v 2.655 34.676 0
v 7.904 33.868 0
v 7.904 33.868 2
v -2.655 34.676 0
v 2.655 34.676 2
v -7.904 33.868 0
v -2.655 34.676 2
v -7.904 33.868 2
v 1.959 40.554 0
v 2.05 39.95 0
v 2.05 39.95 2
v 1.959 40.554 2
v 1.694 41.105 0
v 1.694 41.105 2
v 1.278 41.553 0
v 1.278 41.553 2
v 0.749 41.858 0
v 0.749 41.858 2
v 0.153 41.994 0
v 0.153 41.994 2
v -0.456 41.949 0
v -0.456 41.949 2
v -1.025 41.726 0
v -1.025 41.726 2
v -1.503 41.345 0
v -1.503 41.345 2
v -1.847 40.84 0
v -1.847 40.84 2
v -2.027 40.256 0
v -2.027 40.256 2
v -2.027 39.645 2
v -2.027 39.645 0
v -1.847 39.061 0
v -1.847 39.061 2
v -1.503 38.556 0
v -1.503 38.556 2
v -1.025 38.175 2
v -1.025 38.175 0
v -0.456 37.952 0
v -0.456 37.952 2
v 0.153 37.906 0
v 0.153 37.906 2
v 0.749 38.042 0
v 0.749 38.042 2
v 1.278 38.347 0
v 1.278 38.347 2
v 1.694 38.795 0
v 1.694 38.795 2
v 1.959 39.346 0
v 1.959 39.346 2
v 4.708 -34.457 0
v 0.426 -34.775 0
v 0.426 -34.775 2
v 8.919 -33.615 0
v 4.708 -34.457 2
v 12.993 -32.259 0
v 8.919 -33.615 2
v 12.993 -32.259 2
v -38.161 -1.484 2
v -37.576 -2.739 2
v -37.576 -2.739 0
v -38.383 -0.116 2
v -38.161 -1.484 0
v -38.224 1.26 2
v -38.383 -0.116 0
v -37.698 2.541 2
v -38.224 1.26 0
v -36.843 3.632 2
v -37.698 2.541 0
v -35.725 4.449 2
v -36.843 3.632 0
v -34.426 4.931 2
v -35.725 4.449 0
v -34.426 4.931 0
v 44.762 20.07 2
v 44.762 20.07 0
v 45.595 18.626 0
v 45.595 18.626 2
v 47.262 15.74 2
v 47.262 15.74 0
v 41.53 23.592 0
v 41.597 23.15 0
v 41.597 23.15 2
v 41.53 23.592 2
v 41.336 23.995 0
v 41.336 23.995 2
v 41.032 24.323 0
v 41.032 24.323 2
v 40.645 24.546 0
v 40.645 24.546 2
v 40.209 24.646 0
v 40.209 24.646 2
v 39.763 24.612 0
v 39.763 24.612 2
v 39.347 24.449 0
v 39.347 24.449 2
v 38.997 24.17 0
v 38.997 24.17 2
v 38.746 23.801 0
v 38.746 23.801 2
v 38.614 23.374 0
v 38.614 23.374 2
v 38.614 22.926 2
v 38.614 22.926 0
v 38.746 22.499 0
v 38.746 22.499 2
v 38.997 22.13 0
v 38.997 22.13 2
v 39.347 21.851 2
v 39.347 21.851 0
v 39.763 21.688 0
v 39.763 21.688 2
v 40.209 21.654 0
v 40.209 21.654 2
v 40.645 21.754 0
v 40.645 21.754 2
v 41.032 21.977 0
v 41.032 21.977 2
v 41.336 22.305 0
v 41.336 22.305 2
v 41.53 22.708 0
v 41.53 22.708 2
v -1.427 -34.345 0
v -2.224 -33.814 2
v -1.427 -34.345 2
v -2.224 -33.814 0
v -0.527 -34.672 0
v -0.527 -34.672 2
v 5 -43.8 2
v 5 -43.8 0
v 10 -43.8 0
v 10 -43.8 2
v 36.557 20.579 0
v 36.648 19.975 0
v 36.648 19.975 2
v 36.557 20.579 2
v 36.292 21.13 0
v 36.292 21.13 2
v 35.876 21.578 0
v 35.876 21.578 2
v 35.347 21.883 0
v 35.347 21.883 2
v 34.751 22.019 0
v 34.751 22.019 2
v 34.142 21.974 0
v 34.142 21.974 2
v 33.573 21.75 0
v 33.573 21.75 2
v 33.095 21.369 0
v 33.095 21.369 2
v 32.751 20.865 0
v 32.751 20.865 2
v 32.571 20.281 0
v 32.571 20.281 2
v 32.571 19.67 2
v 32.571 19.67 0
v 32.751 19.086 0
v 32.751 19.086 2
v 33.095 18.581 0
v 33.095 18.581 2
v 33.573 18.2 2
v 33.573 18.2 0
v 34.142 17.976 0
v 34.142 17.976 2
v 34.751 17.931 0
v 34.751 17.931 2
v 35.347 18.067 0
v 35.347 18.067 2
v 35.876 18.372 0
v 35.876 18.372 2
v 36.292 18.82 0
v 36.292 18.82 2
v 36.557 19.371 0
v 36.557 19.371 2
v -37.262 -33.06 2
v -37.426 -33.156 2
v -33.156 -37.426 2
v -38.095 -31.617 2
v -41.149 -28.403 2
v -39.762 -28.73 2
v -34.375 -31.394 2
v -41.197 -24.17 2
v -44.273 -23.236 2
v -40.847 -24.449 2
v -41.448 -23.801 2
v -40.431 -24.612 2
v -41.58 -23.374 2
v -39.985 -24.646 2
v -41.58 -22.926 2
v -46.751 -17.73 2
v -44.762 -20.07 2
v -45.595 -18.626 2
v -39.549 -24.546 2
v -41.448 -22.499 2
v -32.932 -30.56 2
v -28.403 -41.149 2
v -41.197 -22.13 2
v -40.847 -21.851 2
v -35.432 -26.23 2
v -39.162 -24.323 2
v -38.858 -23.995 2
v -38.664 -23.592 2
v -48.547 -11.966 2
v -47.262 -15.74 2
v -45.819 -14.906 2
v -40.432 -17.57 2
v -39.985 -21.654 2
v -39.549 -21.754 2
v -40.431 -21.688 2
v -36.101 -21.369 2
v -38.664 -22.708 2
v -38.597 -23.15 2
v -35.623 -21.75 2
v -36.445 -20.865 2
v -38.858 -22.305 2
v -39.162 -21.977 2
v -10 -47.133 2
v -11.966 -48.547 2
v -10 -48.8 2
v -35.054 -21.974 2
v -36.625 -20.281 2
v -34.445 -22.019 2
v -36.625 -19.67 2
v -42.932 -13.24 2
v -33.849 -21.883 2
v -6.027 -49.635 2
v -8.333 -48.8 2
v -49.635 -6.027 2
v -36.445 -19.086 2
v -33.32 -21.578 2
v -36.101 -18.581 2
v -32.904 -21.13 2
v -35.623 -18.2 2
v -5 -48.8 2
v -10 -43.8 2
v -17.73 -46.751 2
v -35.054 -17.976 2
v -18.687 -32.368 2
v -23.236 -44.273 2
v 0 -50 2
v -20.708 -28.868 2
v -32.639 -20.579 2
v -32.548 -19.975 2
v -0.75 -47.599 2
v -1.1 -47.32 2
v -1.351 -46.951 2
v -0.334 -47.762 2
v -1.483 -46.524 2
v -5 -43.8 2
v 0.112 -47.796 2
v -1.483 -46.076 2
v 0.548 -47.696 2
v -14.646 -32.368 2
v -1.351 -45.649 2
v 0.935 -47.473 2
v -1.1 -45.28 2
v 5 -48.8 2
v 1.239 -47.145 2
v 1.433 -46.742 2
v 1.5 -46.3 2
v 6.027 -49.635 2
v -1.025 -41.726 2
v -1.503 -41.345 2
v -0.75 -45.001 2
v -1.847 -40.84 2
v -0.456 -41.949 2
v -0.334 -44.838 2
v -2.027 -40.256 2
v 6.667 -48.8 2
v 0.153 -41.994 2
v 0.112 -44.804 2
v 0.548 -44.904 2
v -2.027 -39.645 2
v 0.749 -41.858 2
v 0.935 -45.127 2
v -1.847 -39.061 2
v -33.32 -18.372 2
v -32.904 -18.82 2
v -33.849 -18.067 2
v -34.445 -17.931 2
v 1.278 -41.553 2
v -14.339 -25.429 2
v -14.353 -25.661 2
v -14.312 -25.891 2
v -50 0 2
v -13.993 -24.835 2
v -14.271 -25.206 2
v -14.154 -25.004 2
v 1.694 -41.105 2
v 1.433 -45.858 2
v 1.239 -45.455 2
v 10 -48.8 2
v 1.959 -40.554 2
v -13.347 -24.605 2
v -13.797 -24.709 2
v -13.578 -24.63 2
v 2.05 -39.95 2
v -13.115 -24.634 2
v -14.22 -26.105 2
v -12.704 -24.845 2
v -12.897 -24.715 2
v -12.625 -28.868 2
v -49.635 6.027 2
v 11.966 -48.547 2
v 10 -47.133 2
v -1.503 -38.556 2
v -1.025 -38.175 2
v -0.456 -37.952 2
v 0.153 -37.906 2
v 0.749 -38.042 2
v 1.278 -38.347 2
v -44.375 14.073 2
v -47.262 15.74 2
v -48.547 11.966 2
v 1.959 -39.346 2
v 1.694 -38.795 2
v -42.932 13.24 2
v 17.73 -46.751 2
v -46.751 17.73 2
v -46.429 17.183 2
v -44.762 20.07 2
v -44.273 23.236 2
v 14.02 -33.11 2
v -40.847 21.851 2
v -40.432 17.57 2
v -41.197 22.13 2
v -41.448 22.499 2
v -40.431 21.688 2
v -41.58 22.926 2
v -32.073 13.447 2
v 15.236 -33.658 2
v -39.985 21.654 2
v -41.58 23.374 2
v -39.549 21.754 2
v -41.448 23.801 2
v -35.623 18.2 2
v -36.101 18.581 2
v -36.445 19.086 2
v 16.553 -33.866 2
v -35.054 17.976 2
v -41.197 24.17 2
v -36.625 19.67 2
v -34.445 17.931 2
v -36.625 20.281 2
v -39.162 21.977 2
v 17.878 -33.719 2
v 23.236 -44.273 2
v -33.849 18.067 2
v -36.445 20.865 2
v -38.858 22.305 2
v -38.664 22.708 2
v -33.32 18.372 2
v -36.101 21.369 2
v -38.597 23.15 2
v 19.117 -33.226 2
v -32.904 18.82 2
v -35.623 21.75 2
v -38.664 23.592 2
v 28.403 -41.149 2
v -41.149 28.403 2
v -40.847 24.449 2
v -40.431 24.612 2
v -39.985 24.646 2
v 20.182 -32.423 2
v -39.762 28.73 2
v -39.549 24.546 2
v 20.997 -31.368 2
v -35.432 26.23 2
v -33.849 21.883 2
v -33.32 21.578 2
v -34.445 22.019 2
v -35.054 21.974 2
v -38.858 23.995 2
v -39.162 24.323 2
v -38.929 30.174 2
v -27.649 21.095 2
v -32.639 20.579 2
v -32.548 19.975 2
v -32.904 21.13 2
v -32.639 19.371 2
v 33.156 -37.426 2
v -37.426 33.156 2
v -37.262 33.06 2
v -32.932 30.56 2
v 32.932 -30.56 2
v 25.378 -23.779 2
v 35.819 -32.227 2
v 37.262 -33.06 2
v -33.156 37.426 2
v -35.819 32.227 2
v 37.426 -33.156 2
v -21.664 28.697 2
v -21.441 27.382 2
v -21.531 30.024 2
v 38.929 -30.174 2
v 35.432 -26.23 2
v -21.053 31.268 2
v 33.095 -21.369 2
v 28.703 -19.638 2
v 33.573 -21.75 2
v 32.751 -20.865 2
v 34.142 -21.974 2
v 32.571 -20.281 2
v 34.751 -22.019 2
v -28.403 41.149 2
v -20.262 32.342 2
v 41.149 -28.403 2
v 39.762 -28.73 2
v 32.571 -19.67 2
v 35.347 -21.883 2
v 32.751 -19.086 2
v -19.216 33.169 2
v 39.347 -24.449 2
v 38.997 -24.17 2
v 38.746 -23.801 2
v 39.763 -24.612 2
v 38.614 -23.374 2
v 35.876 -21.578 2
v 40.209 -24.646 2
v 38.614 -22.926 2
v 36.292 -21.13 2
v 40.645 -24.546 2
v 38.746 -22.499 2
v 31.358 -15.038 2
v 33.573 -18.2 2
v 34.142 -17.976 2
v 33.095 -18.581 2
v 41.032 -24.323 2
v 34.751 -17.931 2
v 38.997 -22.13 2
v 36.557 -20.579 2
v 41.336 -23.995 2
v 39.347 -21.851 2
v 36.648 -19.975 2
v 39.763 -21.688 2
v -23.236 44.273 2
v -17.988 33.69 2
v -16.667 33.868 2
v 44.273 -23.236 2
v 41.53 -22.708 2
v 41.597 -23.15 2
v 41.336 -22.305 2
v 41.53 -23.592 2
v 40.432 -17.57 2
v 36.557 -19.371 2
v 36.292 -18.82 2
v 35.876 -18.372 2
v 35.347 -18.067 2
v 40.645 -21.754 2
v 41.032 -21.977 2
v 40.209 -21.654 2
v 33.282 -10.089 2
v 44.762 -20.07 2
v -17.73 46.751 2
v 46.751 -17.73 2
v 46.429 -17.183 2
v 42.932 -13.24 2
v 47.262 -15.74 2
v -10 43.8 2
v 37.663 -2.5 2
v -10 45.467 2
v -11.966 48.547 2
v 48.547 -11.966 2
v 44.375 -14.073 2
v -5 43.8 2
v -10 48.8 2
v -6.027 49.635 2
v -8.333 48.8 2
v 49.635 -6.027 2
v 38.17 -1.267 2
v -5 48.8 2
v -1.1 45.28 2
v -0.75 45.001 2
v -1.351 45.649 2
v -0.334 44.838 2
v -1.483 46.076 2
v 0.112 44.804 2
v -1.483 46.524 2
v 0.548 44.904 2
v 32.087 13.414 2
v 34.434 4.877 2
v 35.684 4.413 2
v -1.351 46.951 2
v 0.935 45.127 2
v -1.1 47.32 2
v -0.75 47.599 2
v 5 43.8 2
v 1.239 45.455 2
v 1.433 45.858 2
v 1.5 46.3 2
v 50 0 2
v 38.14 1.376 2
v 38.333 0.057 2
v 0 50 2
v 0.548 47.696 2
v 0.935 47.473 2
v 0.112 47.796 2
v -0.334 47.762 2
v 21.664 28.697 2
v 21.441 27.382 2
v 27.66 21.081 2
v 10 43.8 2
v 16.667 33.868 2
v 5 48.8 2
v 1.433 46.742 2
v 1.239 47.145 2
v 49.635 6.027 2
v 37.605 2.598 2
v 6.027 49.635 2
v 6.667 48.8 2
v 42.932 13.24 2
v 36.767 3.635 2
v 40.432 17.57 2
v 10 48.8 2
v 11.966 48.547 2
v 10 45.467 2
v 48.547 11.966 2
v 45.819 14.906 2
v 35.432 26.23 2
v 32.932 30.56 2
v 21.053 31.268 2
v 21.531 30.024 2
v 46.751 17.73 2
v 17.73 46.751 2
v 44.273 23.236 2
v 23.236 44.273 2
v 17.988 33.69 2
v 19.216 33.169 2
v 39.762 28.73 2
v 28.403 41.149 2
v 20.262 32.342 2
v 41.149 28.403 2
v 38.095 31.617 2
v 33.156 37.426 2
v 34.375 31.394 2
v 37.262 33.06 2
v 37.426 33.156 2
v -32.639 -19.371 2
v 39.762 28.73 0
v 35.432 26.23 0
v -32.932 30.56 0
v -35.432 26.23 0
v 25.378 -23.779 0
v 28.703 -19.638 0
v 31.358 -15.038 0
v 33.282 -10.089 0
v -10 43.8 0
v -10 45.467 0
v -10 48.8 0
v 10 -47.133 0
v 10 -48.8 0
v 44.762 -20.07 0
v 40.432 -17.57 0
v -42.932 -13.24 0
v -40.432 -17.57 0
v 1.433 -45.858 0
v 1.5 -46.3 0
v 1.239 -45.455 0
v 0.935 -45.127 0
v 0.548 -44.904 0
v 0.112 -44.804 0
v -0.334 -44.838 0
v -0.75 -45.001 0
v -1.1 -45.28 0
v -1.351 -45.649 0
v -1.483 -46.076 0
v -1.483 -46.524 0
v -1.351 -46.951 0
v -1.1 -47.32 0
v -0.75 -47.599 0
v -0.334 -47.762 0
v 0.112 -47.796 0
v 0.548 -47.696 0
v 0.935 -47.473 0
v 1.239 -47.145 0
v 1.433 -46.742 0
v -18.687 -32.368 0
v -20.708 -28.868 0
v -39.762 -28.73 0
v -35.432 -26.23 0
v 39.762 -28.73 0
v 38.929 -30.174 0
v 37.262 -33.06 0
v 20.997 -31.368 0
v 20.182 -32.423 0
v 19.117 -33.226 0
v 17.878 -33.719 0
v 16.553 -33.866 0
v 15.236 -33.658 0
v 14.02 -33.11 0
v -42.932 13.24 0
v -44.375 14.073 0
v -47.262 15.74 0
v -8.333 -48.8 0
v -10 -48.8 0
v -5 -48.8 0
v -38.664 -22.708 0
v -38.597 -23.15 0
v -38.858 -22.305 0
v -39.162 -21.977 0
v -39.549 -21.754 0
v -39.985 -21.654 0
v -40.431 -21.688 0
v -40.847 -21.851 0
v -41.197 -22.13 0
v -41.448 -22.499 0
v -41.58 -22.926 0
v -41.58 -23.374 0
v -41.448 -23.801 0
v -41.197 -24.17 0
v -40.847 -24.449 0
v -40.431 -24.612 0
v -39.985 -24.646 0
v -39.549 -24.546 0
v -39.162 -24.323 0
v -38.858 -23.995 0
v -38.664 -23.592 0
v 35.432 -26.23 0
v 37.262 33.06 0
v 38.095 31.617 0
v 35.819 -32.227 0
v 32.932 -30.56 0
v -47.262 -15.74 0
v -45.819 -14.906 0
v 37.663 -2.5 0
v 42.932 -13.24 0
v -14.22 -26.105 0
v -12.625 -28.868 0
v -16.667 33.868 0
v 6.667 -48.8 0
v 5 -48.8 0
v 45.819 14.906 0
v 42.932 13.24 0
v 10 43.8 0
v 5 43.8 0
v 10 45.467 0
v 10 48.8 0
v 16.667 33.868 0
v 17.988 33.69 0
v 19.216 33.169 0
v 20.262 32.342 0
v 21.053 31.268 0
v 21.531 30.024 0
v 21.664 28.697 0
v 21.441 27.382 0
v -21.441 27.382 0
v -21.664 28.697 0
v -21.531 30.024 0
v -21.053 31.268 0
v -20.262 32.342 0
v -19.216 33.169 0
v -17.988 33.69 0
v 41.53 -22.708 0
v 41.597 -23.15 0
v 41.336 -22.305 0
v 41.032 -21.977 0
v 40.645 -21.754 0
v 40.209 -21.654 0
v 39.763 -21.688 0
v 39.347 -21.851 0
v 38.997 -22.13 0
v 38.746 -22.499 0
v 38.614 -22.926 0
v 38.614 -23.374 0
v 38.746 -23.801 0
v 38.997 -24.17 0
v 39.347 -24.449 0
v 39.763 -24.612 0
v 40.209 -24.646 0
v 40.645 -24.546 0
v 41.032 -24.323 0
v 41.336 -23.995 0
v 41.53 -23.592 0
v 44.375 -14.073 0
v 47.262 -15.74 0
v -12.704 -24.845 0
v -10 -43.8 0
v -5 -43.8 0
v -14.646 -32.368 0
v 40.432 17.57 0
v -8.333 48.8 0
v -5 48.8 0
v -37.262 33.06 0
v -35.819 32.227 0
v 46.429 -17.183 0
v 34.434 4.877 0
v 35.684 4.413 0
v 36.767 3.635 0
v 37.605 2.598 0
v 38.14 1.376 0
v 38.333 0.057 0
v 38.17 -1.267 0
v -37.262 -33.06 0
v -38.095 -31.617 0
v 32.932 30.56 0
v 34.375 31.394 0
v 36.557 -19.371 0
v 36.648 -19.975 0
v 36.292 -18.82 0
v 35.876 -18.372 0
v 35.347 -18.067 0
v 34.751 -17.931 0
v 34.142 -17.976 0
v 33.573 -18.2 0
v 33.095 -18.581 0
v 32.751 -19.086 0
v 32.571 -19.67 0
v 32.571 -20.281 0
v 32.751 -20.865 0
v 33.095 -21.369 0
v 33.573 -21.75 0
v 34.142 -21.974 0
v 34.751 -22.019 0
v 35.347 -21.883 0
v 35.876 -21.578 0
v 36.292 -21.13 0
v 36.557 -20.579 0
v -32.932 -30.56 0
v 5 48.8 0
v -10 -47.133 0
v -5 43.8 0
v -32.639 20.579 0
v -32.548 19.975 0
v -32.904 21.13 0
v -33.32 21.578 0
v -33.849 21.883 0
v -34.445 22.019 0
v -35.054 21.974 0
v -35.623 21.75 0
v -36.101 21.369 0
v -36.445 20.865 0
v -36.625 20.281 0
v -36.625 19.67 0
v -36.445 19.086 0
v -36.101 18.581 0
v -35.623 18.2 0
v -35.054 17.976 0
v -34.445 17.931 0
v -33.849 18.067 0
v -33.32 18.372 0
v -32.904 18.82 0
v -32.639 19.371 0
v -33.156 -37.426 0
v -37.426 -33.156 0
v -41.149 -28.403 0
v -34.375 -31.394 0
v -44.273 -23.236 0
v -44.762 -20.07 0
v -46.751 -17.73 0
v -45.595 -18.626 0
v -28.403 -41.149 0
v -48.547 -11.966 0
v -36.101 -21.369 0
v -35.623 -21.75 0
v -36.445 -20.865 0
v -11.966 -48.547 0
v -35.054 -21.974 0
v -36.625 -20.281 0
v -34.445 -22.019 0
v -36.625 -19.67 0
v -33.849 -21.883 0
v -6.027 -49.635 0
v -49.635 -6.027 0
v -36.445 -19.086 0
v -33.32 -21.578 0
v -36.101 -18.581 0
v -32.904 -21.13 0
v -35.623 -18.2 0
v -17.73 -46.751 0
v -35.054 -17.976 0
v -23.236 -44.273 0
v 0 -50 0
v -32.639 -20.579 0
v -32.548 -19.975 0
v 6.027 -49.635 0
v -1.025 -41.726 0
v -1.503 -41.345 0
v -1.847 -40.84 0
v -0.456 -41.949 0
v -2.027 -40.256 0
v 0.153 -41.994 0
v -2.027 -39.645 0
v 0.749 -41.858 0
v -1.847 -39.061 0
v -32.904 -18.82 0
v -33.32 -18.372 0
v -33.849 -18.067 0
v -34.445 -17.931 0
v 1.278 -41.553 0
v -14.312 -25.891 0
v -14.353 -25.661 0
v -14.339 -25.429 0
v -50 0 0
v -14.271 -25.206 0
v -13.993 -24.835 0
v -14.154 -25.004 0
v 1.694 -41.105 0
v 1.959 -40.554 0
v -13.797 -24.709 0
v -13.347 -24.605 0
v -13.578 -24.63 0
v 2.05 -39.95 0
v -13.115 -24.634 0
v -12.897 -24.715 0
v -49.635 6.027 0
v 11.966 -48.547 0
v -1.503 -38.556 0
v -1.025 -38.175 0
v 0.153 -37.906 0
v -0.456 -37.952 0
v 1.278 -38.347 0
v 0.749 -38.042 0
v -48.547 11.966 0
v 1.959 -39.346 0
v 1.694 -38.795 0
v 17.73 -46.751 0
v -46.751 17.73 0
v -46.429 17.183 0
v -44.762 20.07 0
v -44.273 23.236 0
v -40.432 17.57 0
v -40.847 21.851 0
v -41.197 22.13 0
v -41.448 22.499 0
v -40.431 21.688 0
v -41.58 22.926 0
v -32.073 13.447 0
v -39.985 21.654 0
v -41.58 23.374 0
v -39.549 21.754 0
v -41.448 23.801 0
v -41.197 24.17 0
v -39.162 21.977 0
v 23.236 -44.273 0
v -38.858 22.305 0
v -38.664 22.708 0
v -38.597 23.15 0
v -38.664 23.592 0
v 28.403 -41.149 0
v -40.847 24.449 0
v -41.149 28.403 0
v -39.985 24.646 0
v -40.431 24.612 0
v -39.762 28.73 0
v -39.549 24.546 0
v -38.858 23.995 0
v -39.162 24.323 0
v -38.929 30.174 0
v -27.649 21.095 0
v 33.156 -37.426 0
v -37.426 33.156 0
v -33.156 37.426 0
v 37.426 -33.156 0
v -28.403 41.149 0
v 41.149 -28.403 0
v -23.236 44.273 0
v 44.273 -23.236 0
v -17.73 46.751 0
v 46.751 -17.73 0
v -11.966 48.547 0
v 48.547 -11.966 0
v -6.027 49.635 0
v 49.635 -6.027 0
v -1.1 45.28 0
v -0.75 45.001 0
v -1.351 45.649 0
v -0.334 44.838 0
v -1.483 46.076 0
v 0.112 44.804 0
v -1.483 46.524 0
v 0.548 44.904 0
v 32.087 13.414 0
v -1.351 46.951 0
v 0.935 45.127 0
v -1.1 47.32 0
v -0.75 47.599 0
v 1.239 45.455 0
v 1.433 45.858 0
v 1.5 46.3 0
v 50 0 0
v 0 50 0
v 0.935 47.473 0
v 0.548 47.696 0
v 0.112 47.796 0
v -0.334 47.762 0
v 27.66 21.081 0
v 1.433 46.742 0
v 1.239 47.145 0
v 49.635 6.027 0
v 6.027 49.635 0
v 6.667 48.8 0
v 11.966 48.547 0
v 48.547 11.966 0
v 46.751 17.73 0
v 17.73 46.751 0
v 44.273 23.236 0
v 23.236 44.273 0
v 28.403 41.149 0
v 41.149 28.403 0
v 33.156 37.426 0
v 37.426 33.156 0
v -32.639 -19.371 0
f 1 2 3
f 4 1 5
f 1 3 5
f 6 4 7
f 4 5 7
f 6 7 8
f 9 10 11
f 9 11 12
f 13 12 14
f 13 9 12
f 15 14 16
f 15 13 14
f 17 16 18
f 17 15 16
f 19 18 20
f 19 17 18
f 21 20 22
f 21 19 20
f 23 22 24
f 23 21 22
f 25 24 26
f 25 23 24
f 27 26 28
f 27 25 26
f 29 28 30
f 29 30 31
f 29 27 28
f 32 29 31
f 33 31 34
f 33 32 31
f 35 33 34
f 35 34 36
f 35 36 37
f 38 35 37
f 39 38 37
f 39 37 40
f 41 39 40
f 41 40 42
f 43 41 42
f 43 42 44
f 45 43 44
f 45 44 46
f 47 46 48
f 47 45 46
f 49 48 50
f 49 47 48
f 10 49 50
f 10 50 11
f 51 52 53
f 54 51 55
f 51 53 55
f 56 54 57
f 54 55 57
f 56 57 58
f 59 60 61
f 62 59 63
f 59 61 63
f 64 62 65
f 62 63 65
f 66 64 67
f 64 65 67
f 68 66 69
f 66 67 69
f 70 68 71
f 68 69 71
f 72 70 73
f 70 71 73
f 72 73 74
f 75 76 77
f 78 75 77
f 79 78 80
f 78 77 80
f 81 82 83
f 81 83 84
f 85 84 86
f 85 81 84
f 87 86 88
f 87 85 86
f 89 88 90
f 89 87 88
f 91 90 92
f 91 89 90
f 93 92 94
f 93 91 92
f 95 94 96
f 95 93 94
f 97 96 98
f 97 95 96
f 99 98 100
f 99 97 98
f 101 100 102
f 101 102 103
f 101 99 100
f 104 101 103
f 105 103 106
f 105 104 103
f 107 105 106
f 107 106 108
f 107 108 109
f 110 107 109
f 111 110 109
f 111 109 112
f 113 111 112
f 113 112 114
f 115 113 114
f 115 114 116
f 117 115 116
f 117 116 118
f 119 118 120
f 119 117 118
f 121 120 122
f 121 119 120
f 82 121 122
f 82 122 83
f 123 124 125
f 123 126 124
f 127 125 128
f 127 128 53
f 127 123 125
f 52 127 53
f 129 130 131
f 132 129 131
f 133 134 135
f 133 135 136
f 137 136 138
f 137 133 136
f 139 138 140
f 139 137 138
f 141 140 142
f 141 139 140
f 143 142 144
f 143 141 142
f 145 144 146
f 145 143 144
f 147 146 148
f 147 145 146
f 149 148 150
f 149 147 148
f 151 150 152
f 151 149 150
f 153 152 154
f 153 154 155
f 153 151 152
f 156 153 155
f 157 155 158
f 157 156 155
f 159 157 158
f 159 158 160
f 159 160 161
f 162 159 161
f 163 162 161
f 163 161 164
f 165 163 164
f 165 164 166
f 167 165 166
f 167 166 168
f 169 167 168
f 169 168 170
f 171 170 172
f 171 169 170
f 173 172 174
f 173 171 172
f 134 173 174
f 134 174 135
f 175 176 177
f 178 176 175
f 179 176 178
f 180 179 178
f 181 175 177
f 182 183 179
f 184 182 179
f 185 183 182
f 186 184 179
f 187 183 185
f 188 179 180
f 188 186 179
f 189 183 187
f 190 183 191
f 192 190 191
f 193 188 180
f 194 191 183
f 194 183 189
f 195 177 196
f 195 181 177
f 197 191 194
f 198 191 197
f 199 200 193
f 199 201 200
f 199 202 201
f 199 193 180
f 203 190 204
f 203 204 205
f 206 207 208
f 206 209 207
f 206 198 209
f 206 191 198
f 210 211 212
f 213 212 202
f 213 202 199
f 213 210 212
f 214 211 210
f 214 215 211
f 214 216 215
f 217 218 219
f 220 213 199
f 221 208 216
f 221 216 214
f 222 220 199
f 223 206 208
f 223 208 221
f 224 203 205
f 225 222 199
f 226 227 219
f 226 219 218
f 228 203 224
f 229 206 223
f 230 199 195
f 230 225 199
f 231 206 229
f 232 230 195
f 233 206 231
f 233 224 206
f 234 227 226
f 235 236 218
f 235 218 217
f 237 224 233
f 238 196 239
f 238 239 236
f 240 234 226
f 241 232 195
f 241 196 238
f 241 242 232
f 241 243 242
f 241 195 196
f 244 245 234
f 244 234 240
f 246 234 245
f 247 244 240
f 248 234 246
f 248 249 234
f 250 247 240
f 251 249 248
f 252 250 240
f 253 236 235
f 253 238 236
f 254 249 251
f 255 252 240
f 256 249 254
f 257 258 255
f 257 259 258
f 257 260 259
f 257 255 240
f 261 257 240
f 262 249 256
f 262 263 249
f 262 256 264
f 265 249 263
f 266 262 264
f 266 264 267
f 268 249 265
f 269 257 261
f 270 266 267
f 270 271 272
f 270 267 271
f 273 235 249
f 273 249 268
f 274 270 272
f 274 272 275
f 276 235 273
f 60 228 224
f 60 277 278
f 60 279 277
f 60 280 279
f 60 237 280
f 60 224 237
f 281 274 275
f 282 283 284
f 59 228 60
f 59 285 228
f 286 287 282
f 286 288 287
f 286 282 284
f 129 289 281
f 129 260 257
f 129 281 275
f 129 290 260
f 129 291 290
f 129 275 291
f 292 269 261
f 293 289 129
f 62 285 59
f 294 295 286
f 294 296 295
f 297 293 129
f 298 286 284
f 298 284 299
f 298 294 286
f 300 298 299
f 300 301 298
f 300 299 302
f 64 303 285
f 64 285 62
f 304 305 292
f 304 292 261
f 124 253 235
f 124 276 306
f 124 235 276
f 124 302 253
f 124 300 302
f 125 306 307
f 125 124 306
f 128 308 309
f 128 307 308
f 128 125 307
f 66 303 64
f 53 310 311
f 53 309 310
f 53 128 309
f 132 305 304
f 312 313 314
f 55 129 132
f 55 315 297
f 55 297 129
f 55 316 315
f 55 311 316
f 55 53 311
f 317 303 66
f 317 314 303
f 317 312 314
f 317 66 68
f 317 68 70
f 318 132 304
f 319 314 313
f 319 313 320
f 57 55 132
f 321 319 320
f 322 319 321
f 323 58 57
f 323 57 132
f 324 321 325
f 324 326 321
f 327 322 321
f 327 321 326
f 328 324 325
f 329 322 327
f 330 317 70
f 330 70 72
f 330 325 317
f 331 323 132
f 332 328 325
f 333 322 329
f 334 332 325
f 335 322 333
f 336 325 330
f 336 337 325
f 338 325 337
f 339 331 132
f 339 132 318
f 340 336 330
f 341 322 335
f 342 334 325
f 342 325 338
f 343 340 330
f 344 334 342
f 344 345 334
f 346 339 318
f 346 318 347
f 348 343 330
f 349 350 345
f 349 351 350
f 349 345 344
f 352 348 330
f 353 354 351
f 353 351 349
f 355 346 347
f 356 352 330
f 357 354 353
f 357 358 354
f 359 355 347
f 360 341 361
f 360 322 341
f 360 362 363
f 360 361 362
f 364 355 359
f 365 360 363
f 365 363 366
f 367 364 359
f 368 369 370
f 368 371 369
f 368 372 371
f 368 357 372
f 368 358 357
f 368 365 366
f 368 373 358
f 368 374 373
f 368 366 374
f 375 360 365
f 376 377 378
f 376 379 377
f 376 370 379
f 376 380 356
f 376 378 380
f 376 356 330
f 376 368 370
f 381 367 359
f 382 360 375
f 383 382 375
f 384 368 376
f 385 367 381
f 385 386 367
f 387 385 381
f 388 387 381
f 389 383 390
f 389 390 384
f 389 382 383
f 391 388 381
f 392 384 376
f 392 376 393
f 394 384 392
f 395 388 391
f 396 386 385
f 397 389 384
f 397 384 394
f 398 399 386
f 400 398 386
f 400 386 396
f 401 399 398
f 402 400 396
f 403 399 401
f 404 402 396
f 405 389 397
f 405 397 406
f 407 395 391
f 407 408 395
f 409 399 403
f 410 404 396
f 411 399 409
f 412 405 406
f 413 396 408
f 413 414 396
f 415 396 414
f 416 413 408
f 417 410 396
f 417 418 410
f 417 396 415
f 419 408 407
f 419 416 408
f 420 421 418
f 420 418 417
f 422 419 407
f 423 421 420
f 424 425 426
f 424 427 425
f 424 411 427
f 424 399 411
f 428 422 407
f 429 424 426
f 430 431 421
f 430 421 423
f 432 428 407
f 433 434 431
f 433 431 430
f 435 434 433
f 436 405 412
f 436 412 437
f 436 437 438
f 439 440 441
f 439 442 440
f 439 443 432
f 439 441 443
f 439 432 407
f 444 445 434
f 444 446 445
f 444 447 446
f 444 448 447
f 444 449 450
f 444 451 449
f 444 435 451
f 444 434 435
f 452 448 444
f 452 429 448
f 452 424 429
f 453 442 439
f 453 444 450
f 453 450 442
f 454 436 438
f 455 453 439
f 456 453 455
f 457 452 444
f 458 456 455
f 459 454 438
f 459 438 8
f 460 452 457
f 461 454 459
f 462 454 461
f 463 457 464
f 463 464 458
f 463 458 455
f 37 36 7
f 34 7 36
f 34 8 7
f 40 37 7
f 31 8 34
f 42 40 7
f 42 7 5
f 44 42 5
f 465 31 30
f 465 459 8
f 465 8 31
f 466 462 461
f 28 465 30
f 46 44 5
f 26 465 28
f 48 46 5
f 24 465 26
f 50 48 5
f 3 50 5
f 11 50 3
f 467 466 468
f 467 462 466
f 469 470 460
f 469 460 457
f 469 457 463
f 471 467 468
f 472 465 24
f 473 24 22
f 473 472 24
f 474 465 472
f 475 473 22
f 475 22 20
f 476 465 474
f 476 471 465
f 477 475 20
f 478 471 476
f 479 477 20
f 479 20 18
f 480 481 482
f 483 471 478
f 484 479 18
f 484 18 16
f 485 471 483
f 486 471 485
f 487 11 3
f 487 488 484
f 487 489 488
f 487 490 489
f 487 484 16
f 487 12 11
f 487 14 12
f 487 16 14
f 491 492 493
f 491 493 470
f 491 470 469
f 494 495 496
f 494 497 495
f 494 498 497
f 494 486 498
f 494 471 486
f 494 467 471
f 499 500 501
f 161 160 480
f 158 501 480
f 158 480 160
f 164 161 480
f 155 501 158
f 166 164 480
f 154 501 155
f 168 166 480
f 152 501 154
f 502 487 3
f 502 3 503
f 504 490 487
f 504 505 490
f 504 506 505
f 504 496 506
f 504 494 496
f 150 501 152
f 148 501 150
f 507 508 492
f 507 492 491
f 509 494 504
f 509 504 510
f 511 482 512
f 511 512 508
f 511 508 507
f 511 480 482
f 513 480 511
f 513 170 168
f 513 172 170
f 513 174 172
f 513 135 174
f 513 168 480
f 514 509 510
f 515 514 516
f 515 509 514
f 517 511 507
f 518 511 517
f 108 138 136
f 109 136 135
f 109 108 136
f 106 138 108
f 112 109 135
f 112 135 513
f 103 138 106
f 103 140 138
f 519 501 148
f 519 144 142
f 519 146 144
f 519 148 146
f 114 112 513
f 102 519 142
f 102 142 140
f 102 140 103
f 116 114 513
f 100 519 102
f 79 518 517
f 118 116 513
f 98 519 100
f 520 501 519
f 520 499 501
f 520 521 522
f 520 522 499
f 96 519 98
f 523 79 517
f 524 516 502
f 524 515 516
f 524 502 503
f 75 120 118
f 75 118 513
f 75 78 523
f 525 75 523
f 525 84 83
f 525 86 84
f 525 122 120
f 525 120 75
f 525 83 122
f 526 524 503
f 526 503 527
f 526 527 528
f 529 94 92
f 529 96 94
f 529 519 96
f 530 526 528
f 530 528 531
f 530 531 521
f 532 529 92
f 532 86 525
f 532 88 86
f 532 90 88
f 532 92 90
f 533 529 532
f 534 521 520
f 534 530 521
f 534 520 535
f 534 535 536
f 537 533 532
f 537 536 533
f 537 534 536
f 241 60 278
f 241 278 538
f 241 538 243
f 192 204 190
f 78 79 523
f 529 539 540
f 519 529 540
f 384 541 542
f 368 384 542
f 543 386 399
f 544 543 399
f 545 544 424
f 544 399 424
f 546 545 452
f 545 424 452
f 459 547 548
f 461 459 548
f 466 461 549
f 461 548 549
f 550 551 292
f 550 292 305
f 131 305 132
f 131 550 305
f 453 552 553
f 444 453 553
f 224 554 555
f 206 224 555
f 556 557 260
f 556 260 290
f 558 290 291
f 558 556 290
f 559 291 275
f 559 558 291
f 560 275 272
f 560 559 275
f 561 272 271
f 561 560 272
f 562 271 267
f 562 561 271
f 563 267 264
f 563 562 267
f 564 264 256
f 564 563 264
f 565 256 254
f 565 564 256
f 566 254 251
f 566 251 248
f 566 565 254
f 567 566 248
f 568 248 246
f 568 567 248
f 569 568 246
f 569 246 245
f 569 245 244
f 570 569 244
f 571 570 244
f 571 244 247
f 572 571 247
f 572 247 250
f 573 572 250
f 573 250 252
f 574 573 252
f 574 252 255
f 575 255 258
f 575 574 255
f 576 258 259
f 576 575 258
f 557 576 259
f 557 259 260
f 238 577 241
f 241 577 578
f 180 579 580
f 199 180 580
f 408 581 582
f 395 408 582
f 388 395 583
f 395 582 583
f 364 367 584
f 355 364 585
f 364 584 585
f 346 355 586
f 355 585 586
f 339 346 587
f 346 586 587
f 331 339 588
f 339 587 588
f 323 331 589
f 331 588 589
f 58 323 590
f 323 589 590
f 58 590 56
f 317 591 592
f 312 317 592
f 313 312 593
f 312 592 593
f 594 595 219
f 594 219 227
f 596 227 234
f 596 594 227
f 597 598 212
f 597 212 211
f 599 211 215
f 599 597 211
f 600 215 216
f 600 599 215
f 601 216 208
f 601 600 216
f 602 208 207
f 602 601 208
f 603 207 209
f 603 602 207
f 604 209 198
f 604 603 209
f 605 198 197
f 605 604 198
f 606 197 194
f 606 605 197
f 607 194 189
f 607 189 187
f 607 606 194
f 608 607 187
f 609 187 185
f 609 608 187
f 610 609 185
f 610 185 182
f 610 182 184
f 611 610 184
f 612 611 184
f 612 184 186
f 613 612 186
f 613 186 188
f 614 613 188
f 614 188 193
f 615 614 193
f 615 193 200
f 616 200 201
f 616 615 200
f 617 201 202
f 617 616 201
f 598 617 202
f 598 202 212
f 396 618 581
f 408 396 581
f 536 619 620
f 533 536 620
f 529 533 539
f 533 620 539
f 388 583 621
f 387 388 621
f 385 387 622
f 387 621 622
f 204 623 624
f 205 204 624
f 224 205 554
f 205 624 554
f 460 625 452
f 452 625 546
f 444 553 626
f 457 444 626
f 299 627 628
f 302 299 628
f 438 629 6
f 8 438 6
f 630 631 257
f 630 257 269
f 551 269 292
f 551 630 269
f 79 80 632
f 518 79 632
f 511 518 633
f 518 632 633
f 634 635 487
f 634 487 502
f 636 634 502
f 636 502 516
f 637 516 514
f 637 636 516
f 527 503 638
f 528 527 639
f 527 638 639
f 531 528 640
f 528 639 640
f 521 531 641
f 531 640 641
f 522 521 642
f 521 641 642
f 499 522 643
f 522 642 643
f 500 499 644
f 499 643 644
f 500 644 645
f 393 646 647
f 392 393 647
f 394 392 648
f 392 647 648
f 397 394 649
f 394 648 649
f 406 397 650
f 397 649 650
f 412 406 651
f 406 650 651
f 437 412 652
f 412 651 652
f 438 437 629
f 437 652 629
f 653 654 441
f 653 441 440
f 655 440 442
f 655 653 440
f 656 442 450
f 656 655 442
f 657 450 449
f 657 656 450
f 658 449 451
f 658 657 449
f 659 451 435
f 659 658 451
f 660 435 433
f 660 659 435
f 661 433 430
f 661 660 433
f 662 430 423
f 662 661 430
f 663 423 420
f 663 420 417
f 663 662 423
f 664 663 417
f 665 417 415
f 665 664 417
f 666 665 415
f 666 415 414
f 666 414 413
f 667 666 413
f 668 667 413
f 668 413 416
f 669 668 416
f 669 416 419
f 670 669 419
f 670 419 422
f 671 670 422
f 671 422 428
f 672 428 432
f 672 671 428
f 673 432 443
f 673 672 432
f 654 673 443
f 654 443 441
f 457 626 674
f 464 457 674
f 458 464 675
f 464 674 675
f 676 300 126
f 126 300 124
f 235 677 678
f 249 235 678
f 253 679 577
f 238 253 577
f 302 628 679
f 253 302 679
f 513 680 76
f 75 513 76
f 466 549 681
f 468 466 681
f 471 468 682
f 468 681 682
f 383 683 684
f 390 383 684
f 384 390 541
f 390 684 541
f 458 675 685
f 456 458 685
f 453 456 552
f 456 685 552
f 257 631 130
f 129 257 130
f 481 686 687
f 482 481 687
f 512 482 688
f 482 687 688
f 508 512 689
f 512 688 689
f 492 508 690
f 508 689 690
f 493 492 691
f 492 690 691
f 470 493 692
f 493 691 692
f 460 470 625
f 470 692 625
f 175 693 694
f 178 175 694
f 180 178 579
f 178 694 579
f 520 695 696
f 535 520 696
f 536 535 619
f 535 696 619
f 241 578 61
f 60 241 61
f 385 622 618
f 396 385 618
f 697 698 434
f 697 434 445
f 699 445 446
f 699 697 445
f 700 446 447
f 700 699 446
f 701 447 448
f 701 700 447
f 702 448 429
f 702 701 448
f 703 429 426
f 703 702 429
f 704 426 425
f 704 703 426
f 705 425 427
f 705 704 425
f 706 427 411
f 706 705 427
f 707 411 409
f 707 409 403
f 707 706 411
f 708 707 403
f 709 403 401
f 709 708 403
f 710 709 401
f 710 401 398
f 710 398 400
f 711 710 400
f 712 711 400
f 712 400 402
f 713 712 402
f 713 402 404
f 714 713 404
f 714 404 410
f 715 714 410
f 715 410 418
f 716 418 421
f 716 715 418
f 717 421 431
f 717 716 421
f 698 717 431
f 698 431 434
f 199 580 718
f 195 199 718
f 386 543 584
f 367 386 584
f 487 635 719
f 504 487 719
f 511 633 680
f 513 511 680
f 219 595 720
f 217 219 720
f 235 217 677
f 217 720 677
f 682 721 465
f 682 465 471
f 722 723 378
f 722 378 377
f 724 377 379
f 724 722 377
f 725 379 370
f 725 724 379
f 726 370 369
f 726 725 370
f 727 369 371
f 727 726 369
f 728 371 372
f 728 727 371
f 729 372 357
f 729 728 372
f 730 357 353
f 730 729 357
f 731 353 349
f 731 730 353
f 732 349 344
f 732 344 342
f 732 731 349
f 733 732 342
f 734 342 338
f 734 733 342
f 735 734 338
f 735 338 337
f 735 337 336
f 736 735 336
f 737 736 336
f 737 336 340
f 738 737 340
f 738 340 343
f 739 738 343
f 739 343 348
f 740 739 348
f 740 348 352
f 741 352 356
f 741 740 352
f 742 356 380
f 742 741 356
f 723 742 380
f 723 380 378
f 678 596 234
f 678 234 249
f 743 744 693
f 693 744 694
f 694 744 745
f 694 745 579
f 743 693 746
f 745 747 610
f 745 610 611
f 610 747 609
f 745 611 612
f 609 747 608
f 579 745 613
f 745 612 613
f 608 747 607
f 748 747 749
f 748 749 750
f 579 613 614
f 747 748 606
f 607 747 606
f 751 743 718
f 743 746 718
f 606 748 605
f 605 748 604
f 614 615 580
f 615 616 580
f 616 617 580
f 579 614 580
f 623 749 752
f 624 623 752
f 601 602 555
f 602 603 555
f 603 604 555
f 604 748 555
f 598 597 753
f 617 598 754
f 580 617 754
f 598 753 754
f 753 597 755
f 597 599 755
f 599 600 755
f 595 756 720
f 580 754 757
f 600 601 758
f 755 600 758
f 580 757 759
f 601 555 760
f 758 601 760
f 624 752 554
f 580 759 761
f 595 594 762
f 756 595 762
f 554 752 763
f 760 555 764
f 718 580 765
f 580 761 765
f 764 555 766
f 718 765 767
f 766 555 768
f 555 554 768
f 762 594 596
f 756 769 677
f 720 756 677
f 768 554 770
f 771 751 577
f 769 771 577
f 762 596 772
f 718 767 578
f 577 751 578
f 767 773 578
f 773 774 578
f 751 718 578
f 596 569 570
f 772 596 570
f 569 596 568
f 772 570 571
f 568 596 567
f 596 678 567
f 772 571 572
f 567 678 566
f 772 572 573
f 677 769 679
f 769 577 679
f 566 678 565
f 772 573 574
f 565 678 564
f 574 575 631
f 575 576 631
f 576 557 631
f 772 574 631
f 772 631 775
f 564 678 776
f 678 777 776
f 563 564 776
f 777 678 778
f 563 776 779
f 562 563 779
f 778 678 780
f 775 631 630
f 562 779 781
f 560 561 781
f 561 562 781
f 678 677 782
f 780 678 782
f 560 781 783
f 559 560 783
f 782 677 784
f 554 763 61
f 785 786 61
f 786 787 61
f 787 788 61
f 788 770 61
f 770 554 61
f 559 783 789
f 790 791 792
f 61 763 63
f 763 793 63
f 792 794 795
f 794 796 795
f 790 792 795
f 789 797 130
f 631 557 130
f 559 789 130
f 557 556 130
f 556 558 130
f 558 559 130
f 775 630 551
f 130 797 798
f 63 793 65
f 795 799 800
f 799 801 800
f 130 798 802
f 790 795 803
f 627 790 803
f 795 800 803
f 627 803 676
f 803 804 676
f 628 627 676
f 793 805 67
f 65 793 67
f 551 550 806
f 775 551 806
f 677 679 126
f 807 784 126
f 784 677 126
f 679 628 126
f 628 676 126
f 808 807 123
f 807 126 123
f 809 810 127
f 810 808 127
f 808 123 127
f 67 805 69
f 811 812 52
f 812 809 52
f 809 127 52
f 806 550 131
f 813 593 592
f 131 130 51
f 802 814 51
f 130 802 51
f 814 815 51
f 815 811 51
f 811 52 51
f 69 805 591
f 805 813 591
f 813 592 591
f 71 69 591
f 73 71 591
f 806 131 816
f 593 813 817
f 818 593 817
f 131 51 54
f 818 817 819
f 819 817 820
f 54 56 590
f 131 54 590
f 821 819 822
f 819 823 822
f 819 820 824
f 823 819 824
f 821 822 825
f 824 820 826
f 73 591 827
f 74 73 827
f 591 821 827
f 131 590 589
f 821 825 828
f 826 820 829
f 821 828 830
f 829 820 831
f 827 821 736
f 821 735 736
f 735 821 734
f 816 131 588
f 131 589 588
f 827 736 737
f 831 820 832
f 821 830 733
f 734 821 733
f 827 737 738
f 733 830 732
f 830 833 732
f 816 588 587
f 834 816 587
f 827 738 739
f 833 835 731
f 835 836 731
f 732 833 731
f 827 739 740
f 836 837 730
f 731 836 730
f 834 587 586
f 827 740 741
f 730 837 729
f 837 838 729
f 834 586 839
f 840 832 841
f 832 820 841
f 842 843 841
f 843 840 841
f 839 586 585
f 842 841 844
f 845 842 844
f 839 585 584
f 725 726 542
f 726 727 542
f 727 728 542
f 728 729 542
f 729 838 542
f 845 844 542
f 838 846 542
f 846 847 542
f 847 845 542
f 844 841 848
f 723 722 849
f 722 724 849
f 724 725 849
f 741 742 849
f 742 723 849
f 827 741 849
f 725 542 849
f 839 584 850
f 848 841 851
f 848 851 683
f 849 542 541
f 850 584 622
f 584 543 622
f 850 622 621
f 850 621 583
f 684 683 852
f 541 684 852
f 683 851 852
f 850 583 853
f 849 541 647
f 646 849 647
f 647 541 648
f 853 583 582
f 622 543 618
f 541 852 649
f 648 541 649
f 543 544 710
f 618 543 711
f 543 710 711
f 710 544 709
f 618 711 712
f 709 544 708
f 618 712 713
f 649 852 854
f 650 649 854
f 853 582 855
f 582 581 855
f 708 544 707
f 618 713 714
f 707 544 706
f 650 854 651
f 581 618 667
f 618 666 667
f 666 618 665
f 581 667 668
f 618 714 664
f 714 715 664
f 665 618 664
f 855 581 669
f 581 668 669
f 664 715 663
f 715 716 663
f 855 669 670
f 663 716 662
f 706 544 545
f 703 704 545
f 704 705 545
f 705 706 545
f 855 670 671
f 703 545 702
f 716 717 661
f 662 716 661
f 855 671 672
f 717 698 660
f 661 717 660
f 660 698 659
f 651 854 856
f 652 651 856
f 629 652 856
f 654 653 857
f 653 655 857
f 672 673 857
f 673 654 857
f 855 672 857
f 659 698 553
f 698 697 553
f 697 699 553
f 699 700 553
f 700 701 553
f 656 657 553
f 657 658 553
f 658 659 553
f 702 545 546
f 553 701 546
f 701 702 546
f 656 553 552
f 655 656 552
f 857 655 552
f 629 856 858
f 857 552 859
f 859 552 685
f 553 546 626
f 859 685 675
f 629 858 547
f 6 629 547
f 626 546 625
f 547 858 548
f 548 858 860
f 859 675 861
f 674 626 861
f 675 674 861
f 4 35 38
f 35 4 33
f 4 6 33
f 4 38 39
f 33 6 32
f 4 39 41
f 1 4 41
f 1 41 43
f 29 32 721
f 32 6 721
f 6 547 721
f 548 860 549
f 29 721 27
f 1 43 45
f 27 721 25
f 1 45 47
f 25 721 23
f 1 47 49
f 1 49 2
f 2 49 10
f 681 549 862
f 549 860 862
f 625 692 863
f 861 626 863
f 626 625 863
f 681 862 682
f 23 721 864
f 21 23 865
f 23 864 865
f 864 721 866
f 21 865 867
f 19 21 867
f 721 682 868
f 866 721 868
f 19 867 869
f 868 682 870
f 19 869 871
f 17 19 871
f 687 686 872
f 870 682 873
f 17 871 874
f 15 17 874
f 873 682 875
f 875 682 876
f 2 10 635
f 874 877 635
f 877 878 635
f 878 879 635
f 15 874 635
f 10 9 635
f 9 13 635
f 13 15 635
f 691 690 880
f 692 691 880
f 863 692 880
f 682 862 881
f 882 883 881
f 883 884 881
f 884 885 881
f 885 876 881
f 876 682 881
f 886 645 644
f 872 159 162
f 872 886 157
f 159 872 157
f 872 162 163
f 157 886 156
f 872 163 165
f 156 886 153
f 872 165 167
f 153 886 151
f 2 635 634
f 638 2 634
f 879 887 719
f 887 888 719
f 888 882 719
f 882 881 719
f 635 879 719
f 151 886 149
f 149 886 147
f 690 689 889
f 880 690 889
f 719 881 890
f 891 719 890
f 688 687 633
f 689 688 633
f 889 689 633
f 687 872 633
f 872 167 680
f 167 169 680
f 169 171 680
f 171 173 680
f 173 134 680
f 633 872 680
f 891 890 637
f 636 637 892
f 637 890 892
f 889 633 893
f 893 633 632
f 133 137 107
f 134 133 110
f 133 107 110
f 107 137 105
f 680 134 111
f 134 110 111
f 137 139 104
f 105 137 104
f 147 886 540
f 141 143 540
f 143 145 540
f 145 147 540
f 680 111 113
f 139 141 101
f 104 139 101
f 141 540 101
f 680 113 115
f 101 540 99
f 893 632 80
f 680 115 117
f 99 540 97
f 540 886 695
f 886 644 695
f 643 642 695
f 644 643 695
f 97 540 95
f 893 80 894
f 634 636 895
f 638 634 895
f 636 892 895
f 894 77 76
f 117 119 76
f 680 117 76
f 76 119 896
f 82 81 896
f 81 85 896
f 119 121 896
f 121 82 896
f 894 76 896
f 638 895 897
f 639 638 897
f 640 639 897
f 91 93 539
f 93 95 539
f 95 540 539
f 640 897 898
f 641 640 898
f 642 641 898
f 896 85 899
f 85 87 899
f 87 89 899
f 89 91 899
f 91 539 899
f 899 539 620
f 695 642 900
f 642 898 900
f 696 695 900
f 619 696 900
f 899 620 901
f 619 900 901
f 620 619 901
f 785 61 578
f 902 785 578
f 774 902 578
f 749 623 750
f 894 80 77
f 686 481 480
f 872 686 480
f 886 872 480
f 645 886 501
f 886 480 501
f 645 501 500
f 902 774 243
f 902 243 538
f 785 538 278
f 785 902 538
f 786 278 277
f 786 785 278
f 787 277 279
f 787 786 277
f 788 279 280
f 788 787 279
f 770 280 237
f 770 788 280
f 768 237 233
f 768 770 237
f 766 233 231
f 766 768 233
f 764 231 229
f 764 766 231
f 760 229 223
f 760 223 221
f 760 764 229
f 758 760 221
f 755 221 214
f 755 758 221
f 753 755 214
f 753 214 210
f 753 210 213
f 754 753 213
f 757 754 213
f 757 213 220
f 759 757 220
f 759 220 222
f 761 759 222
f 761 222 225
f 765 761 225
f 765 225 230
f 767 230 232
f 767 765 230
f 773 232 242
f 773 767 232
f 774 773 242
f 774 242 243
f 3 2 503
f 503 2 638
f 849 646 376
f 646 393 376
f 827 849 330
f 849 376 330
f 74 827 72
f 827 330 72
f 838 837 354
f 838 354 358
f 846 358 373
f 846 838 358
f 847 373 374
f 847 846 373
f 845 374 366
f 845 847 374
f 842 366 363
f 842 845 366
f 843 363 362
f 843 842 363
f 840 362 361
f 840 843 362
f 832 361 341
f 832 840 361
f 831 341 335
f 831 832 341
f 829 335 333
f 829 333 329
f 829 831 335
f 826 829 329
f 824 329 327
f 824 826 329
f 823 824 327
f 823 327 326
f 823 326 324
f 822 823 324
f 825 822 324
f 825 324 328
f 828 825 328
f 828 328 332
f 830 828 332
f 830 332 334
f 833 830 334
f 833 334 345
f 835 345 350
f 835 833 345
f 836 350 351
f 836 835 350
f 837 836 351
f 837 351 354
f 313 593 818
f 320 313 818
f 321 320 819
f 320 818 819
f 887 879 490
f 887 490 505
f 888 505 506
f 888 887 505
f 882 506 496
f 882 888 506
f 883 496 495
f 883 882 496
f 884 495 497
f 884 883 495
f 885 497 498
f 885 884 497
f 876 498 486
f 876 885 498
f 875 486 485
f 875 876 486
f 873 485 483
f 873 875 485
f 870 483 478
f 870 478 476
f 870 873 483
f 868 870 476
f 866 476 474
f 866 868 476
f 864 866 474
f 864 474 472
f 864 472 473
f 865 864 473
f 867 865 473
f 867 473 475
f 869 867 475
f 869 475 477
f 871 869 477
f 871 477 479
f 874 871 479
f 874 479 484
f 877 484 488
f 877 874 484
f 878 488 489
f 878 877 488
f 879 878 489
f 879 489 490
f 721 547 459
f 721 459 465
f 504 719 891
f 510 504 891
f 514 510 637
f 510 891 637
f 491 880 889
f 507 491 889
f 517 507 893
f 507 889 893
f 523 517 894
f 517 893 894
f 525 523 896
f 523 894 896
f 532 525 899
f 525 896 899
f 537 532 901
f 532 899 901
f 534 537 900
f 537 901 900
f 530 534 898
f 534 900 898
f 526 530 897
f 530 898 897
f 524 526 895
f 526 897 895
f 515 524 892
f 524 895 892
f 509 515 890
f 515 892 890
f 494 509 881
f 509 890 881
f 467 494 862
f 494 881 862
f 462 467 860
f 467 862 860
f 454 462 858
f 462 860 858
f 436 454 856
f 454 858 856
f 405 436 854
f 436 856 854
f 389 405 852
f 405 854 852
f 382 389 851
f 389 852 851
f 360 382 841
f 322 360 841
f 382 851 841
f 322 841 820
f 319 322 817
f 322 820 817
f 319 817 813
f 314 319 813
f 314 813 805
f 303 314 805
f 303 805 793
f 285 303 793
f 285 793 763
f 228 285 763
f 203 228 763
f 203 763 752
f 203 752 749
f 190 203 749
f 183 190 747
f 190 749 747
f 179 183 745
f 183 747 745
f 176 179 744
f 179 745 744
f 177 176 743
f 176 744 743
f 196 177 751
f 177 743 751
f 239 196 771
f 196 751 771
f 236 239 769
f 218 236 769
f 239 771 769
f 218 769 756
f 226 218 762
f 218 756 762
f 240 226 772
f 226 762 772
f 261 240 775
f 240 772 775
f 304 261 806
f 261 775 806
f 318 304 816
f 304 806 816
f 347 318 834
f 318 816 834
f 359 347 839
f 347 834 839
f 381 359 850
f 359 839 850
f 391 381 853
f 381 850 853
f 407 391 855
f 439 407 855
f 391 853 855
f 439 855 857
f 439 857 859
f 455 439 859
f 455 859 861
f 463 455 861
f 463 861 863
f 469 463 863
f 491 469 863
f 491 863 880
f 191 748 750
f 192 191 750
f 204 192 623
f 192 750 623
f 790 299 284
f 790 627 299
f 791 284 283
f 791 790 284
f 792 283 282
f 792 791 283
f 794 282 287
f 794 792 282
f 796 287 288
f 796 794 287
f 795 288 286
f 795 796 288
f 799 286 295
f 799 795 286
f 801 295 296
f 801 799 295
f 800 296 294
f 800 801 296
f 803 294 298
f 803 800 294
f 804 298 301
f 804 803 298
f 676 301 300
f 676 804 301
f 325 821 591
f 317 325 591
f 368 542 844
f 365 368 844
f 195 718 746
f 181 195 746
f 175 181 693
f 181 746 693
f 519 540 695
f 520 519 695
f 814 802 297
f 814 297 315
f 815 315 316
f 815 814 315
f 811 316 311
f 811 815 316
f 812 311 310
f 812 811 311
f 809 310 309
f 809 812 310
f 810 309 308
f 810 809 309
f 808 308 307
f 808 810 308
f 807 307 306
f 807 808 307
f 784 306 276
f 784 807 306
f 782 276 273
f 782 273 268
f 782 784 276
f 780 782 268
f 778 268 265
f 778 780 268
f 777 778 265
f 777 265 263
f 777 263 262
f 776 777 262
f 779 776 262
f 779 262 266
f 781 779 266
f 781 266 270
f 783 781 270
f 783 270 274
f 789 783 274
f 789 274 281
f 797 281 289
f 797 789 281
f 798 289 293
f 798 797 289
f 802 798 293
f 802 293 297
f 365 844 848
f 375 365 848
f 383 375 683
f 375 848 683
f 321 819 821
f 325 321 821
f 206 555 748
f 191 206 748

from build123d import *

# Parameters (mm, degrees)
ESQUISSE1_R        = 50
ESQUISSE1_W        = 5
ESQUISSE1_H        = 5
ESQUISSE1_R_2      = 1.5
ESQUISSE1_R_3      = 2.05
BOSS_EXTRU_1_DEPTH = 2
SKETCH3_W          = 1
SKETCH3_H          = 8
CUT_EXTRUDE2_DEPTH = 10
CUT_EXTRUDE5_DEPTH = 10
FILLET1_R          = 1
FILLET2_R          = 4


with BuildPart() as part:
    # Esquisse1 → Boss.-Extru.1 (new body)
    with BuildSketch(Plane.XY):
        Circle(ESQUISSE1_R)
        Polygon((-39.762039705, -28.730127019), (-35.431912686, -26.230127019), (-32.931912686, -30.560254038), (-37.262039705, -33.060254038), align=None, mode=Mode.SUBTRACT)
        with Locations((-7.5, -46.3)):
            Rectangle(ESQUISSE1_W, ESQUISSE1_H, mode=Mode.SUBTRACT)
        with Locations((-40.096976195, -23.15)):
            Circle(ESQUISSE1_R_2, mode=Mode.SUBTRACT)
        Polygon((-42.931912686, -13.239745962), (-40.431912686, -17.569872981), (-44.762039705, -20.069872981), (-47.262039705, -15.739745962), align=None, mode=Mode.SUBTRACT)
        with Locations((-34.597845014, -19.975075133)):
            Circle(ESQUISSE1_R_3, mode=Mode.SUBTRACT)
        with BuildLine():
            ThreePointArc((-37.576499896, -2.739399901), (-35.858643923, 4.373966246), (-28.839360147, 2.304990085))
            Line((-28.839360147, 2.304990085), (-14.645940725, -25.367513459))
            Line((-14.645940725, -25.367513459), (-12.625214782, -28.867513459))
            Line((-12.625214782, -28.867513459), (-14.645940725, -32.367513459))
            Line((-14.645940725, -32.367513459), (-18.687392609, -32.367513459))
            Line((-18.687392609, -32.367513459), (-20.708118551, -28.867513459))
            Line((-20.708118551, -28.867513459), (-37.576499896, -2.739399901))
        make_face(mode=Mode.SUBTRACT)
        with Locations((-16.671397033, -9.625235564)):
            Circle(ESQUISSE1_R_3, mode=Mode.SUBTRACT)
        with Locations((0, -46.3)):
            Circle(ESQUISSE1_R_2, mode=Mode.SUBTRACT)
        with Locations((7.5, -46.3)):
            Rectangle(ESQUISSE1_W, ESQUISSE1_H, mode=Mode.SUBTRACT)
        with Locations((0, -39.950150265)):
            Circle(ESQUISSE1_R_3, mode=Mode.SUBTRACT)
        Polygon((32.931912686, -30.560254038), (35.431912686, -26.230127019), (39.762039705, -28.730127019), (37.262039705, -33.060254038), align=None, mode=Mode.SUBTRACT)
        with Locations((0, -19.232757636)):
            Circle(ESQUISSE1_R_3, mode=Mode.SUBTRACT)
        with Locations((16.666666667, -9.622504487)):
            Circle(ESQUISSE1_R_3, mode=Mode.SUBTRACT)
        with Locations((34.597845014, -19.975075132)):
            Circle(ESQUISSE1_R_3, mode=Mode.SUBTRACT)
        with BuildLine():
            ThreePointArc((20.996793686, -31.367513459), (14.166666667, -33.197640478), (12.336539648, -26.367513459))
            Line((12.336539648, -26.367513459), (29.003206314, 2.5))
            ThreePointArc((29.003206314, 2.5), (35.833333333, 4.330127019), (37.663460352, -2.5))
            Line((37.663460352, -2.5), (20.996793686, -31.367513459))
        make_face(mode=Mode.SUBTRACT)
        with Locations((40.096976195, -23.15)):
            Circle(ESQUISSE1_R_2, mode=Mode.SUBTRACT)
        Polygon((44.762039705, -20.069872981), (40.431912686, -17.569872981), (42.931912686, -13.239745962), (47.262039705, -15.739745962), align=None, mode=Mode.SUBTRACT)
        Polygon((-44.762039705, 20.069872981), (-40.431912686, 17.569872981), (-42.931912686, 13.239745962), (-47.262039705, 15.739745962), align=None, mode=Mode.SUBTRACT)
        with Locations((-40.096976195, 23.15)):
            Circle(ESQUISSE1_R_2, mode=Mode.SUBTRACT)
        with Locations((-34.597845014, 19.975075133)):
            Circle(ESQUISSE1_R_3, mode=Mode.SUBTRACT)
        with Locations((-16.671397032, 9.625235564)):
            Circle(ESQUISSE1_R_3, mode=Mode.SUBTRACT)
        Polygon((-32.931912686, 30.560254038), (-35.431912686, 26.230127019), (-39.762039705, 28.730127019), (-37.262039705, 33.060254038), align=None, mode=Mode.SUBTRACT)
        with Locations((0, 39.950150265)):
            Circle(ESQUISSE1_R_3, mode=Mode.SUBTRACT)
        with Locations((-7.5, 46.3)):
            Rectangle(ESQUISSE1_W, ESQUISSE1_H, mode=Mode.SUBTRACT)
        Circle(ESQUISSE1_R_3, mode=Mode.SUBTRACT)
        with Locations((16.669571796, 9.624181764)):
            Circle(ESQUISSE1_R_3, mode=Mode.SUBTRACT)
        with Locations((0, 19.165334425)):
            Circle(ESQUISSE1_R_3, mode=Mode.SUBTRACT)
        with Locations((34.597845014, 19.975075133)):
            Circle(ESQUISSE1_R_3, mode=Mode.SUBTRACT)
        Polygon((42.931912686, 13.239745962), (40.431912686, 17.569872981), (44.762039705, 20.069872981), (47.262039705, 15.739745962), align=None, mode=Mode.SUBTRACT)
        with Locations((40.096976195, 23.15)):
            Circle(ESQUISSE1_R_2, mode=Mode.SUBTRACT)
        with BuildLine():
            ThreePointArc((-16.666666667, 23.867513459), (-21.666666667, 28.867513459), (-16.666666667, 33.867513459))
            Line((-16.666666667, 33.867513459), (16.666666667, 33.867513459))
            ThreePointArc((16.666666667, 33.867513459), (21.666666667, 28.867513459), (16.666666667, 23.867513459))
            Line((16.666666667, 23.867513459), (-16.666666667, 23.867513459))
        make_face(mode=Mode.SUBTRACT)
        with Locations((0, 46.3)):
            Circle(ESQUISSE1_R_2, mode=Mode.SUBTRACT)
        with Locations((7.5, 46.3)):
            Rectangle(ESQUISSE1_W, ESQUISSE1_H, mode=Mode.SUBTRACT)
        Polygon((39.762039705, 28.730127019), (35.431912686, 26.230127019), (32.931912686, 30.560254038), (37.262039705, 33.060254038), align=None, mode=Mode.SUBTRACT)
    extrude(amount=BOSS_EXTRU_1_DEPTH)

    # Sketch3 → Cut-Extrude2 (cut)
    with BuildSketch(Plane.XY.offset(2)):
        with Locations((-10.5, 0)):
            Rectangle(SKETCH3_W, SKETCH3_H)
        with Locations((-22.833333333, 0)):
            Rectangle(SKETCH3_W, SKETCH3_H)
        Polygon((-13.233653965, 23.921361037), (-14.099679369, 23.421361037), (-12.349679369, 20.390272124), (-15.380768282, 18.640272124), (-14.880768282, 17.77424672), (-11.849679369, 19.52424672), (-10.099679369, 16.493157806), (-9.233653965, 16.993157806), (-10.983653965, 20.02424672), (-7.952565052, 21.77424672), (-8.452565052, 22.640272124), (-11.483653965, 20.890272124), align=None)
        Polygon((15.130768282, 18.207259422), (14.630768282, 17.341234018), (7.702565052, 21.341234018), (8.202565052, 22.207259422), align=None)
        Polygon((8.202565052, -22.207259422), (7.702565052, -21.341234018), (14.630768282, -17.341234018), (15.130768282, -18.207259422), align=None)
        Polygon((27.333333333, -0.5), (27.333333333, 0.5), (23.833333333, 0.5), (23.833333333, 4), (22.833333333, 4), (22.833333333, 0.5), (19.333333333, 0.5), (19.333333333, -0.5), (22.833333333, -0.5), (22.833333333, -4), (23.833333333, -4), (23.833333333, -0.5), align=None)
        Polygon((-14.099679369, -23.421361037), (-13.233653965, -23.921361037), (-11.483653965, -20.890272124), (-8.452565052, -22.640272124), (-7.952565052, -21.77424672), (-10.983653965, -20.02424672), (-9.233653965, -16.993157806), (-10.099679369, -16.493157806), (-11.849679369, -19.52424672), (-14.880768282, -17.77424672), (-15.380768282, -18.640272124), (-12.349679369, -20.390272124), align=None)
        Polygon((-20.834234776, 12.184801987), (-19.940304487, 11.668776346), (-20.102964744, 11.386925384), (-20.996895032, 11.902951025), (-21.517828526, 11.000607275), (-21.800380609, 11.163968654), (-21.279447115, 12.066312404), (-22.173377404, 12.582338045), (-22.010717147, 12.864189006), (-21.116786859, 12.348163365), (-20.596554487, 13.24840375), (-20.314002404, 13.085042371), align=None)
    extrude(amount=-CUT_EXTRUDE2_DEPTH, mode=Mode.SUBTRACT)

    # Sketch5 → Cut-Extrude5 (cut)
    with BuildSketch(Plane.XY.offset(2)):
        with BuildLine():
            Line((-16.642935498, -21.474029915), (-1.119551078, -34.759587589))
            ThreePointArc((-1.119551078, -34.759587589), (26.640402268, 22.355565101), (-34.426269912, 4.930949597))
            Line((-34.426269912, 4.930949597), (-16.642935498, -21.474029915))
        make_face()
    extrude(amount=-CUT_EXTRUDE5_DEPTH, mode=Mode.SUBTRACT)

    # Fillet1
    fillet1_edges = [part.edges().sort_by_distance(p)[0] for p in [
        (-16.642935498, -21.474029915, 1),
    ]]
    fillet(fillet1_edges, radius=FILLET1_R)

    # Fillet2
    fillet2_edges = [part.edges().sort_by_distance(p)[0] for p in [
        (-1.119551078, -34.759587589, 1),
    ]]
    fillet(fillet2_edges, radius=FILLET2_R)


solid = part.part
